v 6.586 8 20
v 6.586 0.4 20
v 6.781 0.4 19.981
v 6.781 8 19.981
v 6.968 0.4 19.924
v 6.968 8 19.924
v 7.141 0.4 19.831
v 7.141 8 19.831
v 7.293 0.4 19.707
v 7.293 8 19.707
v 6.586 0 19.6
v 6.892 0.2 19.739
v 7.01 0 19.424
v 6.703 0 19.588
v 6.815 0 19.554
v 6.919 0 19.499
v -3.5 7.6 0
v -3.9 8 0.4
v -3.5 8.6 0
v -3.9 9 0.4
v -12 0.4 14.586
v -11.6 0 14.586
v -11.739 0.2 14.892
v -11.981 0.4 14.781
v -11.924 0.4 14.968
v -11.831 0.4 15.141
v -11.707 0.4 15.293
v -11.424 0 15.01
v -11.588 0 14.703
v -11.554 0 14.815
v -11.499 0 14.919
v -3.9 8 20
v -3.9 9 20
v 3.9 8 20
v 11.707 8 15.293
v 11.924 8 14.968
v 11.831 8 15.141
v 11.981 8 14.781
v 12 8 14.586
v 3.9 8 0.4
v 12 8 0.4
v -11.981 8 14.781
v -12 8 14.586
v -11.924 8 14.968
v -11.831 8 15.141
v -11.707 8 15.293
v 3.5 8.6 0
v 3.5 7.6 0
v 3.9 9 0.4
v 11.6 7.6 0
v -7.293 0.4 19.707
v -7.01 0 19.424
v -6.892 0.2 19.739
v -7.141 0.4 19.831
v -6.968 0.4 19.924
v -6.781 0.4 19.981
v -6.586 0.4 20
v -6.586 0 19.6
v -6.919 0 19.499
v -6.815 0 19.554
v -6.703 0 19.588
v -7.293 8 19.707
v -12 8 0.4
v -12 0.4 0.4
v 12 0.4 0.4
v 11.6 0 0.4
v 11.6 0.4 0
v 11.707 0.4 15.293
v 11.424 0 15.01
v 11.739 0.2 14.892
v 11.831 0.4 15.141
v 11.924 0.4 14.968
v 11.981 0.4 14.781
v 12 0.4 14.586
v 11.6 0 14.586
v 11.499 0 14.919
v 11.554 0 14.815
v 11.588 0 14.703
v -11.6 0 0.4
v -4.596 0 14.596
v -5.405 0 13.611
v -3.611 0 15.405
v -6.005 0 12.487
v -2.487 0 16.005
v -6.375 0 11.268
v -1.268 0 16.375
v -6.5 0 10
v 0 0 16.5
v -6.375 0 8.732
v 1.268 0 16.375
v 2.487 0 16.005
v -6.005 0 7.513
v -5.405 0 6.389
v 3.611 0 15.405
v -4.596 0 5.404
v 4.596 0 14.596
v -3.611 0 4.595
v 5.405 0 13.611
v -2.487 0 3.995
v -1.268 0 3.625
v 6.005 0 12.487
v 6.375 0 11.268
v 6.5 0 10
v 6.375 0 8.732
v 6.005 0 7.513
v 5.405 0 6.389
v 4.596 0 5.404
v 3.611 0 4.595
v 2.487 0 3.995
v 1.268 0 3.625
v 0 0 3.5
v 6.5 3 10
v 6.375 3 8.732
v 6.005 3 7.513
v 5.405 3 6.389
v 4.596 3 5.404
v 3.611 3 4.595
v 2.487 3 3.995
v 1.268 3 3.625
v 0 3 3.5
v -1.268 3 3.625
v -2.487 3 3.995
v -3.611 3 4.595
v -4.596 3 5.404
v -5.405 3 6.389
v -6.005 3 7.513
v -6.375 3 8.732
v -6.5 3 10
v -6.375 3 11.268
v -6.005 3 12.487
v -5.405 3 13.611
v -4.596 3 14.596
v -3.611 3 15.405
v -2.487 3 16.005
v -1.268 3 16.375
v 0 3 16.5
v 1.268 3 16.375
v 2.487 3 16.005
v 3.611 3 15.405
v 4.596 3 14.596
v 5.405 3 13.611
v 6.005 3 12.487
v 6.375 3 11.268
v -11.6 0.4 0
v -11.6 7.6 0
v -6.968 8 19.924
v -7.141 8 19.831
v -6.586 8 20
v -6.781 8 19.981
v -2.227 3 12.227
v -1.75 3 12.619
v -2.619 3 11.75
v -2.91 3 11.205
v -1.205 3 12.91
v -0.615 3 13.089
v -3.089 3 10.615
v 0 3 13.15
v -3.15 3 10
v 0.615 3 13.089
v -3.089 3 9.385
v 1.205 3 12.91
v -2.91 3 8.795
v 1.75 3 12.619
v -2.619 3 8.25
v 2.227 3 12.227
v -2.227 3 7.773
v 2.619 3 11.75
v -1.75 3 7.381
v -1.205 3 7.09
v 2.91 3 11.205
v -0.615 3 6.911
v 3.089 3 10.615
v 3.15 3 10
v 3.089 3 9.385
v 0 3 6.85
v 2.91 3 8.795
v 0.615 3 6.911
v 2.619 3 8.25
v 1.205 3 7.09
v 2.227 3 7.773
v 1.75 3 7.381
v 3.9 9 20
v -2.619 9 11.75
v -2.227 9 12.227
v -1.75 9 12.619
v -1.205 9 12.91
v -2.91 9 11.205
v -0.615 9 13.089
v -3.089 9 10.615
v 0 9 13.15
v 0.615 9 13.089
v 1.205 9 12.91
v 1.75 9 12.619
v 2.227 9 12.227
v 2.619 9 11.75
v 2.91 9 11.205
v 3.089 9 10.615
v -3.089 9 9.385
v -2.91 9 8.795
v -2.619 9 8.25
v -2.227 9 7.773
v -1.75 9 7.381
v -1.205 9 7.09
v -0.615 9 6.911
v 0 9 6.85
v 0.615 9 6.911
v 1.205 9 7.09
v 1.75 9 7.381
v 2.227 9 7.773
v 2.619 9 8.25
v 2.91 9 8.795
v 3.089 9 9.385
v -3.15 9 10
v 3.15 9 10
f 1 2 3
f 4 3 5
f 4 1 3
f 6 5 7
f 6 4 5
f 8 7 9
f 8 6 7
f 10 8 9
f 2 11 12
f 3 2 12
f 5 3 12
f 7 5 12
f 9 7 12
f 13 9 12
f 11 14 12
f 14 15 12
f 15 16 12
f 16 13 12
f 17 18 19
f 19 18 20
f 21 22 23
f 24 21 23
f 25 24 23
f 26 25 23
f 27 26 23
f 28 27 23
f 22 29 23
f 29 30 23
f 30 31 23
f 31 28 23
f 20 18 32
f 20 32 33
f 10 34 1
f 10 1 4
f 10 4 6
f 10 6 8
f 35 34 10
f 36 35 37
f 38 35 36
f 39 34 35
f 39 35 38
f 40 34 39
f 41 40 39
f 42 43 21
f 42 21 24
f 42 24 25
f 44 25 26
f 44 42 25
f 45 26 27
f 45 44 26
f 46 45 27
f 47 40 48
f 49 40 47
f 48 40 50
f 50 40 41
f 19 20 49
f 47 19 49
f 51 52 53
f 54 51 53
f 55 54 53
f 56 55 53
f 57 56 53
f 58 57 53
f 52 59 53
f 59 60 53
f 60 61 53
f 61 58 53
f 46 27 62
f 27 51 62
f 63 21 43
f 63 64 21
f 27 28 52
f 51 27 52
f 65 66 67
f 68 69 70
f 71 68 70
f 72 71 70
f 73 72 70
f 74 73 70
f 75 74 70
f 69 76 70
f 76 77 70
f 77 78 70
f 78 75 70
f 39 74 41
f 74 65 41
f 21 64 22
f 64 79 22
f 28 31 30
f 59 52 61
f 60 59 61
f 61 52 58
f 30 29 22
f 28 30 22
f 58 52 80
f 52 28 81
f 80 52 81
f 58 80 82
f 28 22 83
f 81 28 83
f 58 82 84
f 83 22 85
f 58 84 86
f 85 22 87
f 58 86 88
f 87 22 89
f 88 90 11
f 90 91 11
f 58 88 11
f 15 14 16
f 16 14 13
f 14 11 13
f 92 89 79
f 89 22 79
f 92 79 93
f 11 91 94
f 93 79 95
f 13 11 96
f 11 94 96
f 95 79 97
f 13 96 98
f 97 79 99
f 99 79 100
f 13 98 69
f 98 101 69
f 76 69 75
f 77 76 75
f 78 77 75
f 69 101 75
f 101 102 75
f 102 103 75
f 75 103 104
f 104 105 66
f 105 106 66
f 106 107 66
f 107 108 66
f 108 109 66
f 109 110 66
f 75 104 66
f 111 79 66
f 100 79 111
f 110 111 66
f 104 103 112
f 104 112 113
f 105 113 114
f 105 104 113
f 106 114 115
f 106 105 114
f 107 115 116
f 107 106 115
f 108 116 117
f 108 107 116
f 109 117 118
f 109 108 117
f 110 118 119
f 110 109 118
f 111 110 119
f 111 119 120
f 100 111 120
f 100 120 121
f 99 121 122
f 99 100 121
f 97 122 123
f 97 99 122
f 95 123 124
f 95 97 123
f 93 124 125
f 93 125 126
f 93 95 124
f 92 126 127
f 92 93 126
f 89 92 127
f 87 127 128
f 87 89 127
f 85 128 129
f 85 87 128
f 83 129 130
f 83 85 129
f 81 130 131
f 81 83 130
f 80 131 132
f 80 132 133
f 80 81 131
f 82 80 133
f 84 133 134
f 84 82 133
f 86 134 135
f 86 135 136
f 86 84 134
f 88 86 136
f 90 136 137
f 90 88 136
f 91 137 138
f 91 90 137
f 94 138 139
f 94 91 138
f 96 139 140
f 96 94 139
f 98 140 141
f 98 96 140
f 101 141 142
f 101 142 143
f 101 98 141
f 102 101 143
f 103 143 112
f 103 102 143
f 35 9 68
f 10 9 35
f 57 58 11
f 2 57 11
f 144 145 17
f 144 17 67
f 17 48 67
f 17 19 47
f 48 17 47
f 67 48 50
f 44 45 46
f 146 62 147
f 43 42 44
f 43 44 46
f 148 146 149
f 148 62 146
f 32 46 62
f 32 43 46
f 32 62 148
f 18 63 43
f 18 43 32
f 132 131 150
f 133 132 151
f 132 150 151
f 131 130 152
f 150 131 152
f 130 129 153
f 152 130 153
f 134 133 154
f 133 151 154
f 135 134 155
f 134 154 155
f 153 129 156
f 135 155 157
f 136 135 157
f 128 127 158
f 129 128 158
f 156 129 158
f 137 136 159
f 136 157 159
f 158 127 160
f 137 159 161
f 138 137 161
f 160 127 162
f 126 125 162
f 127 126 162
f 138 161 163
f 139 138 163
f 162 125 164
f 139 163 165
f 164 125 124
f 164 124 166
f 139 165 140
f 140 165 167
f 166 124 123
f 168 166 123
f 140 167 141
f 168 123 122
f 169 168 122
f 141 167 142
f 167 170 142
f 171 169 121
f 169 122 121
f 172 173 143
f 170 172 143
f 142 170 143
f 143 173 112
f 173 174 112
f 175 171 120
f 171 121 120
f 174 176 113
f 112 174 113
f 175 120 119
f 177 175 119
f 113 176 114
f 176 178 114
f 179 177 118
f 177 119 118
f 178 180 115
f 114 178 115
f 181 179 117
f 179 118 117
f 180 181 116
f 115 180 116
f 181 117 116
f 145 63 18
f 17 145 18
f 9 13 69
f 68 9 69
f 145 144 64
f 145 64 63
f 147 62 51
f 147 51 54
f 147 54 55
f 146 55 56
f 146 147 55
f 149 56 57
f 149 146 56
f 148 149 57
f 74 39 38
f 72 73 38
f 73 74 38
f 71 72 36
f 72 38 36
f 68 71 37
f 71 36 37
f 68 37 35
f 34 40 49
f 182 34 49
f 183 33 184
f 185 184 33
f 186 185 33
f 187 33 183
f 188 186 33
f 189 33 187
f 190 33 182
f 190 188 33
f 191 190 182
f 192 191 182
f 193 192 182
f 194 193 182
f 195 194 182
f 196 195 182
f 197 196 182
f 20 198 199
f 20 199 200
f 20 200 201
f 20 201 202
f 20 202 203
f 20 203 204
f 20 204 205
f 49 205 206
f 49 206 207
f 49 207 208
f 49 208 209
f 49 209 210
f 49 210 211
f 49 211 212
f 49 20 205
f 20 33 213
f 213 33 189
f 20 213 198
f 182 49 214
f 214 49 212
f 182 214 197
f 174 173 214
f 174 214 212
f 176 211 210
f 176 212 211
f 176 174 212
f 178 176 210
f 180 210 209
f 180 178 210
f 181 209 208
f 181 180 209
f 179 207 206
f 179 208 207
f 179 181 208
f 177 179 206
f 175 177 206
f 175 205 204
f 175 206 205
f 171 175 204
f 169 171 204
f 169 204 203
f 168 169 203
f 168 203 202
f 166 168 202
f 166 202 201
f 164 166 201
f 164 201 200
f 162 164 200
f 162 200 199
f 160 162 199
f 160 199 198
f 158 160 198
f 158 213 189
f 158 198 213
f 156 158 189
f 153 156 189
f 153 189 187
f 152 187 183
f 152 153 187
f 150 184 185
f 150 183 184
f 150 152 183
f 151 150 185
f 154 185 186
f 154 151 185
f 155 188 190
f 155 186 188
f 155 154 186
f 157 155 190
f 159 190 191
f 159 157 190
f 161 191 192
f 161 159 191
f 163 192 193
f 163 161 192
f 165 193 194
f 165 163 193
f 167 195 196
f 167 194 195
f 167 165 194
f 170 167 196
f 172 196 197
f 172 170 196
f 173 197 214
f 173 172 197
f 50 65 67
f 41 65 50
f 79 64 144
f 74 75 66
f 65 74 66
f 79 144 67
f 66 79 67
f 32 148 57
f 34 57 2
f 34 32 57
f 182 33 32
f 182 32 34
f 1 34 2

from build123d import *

# Parameters (mm, degrees)
CYLINDER_R        = 3.15
CYLINDER_DEPTH    = 10
CYLINDER001_R     = 6.5
CYLINDER001_DEPTH = 3
BOX_W             = 24
BOX_H             = 8
BOX_DEPTH         = 20
CHAMFER_SIZE      = 5
BOX001_W          = 7.8
BOX001_H          = 1
BOX001_DEPTH      = 20
FILLET_R          = 1
CHAMFER001_SIZE   = 0.4


with BuildPart() as cylinder:
    # Cylinder → Cylinder (new body)
    with BuildSketch(Plane(origin=(0, 0, 10), x_dir=(1, 0, 0), z_dir=(0, 1, 0))):
        Circle(CYLINDER_R)
    extrude(amount=CYLINDER_DEPTH)


with BuildPart() as fusion:
    # Cylinder001 → Cylinder001 (new body)
    with BuildSketch(Plane(origin=(0, 0, 10), x_dir=(1, 0, 0), z_dir=(0, 1, 0))):
        Circle(CYLINDER001_R)
    extrude(amount=CYLINDER001_DEPTH)

    # Fusion: union Cylinder
    add(cylinder.part)


with BuildPart() as chamfer_body:
    # Box → Box (new body)
    with BuildSketch(Plane(origin=(-12, 0, 0), x_dir=(1, 0, 0), z_dir=(0, 0, 1))):
        with Locations((12, 4)):
            Rectangle(BOX_W, BOX_H)
    extrude(amount=BOX_DEPTH)

    # Chamfer
    chamfer_edges = [chamfer_body.edges().sort_by_distance(p)[0] for p in [
        (-12, 4, 20),
        (12, 4, 20),
    ]]
    chamfer(chamfer_edges, length=CHAMFER_SIZE)


with BuildPart() as chamfer001:
    # Box001 → Box001 (new body)
    with BuildSketch(Plane(origin=(-3.9, 8, 0), x_dir=(1, 0, 0), z_dir=(0, 0, 1))):
        with Locations((3.9, 0.5)):
            Rectangle(BOX001_W, BOX001_H)
    extrude(amount=BOX001_DEPTH)

    # Fusion001: union Chamfer body
    add(chamfer_body.part)

    # Cut: cut Fusion
    add(fusion.part, mode=Mode.SUBTRACT)

    # Fillet
    fillet_edges = [chamfer001.edges().sort_by_distance(p)[0] for p in [
        (-12, 4, 15),
        (-7, 4, 20),
        (12, 4, 15),
        (7, 4, 20),
    ]]
    fillet(fillet_edges, radius=FILLET_R)

    # Chamfer001
    chamfer001_edges = [chamfer001.edges().sort_by_distance(p)[0] for p in [
        (-12, 0, 7.292893),
        (-12, 4, 0),
        (12, 0, 7.292893),
        (0, 0, 0),
        (-11.92388, 0, 14.96847),
        (-9.5, 0, 17.5),
        (-6.96847, 0, 19.92388),
        (0, 0, 20),
        (6.96847, 0, 19.92388),
        (9.5, 0, 17.5),
        (11.92388, 0, 14.96847),
        (-7.95, 8, 0),
        (12, 4, 0),
        (7.95, 8, 0),
        (-3.9, 8.5, 0),
        (0, 9, 0),
        (3.9, 8.5, 0),
    ]]
    chamfer(chamfer001_edges, length=CHAMFER001_SIZE)


solid = chamfer001.part
